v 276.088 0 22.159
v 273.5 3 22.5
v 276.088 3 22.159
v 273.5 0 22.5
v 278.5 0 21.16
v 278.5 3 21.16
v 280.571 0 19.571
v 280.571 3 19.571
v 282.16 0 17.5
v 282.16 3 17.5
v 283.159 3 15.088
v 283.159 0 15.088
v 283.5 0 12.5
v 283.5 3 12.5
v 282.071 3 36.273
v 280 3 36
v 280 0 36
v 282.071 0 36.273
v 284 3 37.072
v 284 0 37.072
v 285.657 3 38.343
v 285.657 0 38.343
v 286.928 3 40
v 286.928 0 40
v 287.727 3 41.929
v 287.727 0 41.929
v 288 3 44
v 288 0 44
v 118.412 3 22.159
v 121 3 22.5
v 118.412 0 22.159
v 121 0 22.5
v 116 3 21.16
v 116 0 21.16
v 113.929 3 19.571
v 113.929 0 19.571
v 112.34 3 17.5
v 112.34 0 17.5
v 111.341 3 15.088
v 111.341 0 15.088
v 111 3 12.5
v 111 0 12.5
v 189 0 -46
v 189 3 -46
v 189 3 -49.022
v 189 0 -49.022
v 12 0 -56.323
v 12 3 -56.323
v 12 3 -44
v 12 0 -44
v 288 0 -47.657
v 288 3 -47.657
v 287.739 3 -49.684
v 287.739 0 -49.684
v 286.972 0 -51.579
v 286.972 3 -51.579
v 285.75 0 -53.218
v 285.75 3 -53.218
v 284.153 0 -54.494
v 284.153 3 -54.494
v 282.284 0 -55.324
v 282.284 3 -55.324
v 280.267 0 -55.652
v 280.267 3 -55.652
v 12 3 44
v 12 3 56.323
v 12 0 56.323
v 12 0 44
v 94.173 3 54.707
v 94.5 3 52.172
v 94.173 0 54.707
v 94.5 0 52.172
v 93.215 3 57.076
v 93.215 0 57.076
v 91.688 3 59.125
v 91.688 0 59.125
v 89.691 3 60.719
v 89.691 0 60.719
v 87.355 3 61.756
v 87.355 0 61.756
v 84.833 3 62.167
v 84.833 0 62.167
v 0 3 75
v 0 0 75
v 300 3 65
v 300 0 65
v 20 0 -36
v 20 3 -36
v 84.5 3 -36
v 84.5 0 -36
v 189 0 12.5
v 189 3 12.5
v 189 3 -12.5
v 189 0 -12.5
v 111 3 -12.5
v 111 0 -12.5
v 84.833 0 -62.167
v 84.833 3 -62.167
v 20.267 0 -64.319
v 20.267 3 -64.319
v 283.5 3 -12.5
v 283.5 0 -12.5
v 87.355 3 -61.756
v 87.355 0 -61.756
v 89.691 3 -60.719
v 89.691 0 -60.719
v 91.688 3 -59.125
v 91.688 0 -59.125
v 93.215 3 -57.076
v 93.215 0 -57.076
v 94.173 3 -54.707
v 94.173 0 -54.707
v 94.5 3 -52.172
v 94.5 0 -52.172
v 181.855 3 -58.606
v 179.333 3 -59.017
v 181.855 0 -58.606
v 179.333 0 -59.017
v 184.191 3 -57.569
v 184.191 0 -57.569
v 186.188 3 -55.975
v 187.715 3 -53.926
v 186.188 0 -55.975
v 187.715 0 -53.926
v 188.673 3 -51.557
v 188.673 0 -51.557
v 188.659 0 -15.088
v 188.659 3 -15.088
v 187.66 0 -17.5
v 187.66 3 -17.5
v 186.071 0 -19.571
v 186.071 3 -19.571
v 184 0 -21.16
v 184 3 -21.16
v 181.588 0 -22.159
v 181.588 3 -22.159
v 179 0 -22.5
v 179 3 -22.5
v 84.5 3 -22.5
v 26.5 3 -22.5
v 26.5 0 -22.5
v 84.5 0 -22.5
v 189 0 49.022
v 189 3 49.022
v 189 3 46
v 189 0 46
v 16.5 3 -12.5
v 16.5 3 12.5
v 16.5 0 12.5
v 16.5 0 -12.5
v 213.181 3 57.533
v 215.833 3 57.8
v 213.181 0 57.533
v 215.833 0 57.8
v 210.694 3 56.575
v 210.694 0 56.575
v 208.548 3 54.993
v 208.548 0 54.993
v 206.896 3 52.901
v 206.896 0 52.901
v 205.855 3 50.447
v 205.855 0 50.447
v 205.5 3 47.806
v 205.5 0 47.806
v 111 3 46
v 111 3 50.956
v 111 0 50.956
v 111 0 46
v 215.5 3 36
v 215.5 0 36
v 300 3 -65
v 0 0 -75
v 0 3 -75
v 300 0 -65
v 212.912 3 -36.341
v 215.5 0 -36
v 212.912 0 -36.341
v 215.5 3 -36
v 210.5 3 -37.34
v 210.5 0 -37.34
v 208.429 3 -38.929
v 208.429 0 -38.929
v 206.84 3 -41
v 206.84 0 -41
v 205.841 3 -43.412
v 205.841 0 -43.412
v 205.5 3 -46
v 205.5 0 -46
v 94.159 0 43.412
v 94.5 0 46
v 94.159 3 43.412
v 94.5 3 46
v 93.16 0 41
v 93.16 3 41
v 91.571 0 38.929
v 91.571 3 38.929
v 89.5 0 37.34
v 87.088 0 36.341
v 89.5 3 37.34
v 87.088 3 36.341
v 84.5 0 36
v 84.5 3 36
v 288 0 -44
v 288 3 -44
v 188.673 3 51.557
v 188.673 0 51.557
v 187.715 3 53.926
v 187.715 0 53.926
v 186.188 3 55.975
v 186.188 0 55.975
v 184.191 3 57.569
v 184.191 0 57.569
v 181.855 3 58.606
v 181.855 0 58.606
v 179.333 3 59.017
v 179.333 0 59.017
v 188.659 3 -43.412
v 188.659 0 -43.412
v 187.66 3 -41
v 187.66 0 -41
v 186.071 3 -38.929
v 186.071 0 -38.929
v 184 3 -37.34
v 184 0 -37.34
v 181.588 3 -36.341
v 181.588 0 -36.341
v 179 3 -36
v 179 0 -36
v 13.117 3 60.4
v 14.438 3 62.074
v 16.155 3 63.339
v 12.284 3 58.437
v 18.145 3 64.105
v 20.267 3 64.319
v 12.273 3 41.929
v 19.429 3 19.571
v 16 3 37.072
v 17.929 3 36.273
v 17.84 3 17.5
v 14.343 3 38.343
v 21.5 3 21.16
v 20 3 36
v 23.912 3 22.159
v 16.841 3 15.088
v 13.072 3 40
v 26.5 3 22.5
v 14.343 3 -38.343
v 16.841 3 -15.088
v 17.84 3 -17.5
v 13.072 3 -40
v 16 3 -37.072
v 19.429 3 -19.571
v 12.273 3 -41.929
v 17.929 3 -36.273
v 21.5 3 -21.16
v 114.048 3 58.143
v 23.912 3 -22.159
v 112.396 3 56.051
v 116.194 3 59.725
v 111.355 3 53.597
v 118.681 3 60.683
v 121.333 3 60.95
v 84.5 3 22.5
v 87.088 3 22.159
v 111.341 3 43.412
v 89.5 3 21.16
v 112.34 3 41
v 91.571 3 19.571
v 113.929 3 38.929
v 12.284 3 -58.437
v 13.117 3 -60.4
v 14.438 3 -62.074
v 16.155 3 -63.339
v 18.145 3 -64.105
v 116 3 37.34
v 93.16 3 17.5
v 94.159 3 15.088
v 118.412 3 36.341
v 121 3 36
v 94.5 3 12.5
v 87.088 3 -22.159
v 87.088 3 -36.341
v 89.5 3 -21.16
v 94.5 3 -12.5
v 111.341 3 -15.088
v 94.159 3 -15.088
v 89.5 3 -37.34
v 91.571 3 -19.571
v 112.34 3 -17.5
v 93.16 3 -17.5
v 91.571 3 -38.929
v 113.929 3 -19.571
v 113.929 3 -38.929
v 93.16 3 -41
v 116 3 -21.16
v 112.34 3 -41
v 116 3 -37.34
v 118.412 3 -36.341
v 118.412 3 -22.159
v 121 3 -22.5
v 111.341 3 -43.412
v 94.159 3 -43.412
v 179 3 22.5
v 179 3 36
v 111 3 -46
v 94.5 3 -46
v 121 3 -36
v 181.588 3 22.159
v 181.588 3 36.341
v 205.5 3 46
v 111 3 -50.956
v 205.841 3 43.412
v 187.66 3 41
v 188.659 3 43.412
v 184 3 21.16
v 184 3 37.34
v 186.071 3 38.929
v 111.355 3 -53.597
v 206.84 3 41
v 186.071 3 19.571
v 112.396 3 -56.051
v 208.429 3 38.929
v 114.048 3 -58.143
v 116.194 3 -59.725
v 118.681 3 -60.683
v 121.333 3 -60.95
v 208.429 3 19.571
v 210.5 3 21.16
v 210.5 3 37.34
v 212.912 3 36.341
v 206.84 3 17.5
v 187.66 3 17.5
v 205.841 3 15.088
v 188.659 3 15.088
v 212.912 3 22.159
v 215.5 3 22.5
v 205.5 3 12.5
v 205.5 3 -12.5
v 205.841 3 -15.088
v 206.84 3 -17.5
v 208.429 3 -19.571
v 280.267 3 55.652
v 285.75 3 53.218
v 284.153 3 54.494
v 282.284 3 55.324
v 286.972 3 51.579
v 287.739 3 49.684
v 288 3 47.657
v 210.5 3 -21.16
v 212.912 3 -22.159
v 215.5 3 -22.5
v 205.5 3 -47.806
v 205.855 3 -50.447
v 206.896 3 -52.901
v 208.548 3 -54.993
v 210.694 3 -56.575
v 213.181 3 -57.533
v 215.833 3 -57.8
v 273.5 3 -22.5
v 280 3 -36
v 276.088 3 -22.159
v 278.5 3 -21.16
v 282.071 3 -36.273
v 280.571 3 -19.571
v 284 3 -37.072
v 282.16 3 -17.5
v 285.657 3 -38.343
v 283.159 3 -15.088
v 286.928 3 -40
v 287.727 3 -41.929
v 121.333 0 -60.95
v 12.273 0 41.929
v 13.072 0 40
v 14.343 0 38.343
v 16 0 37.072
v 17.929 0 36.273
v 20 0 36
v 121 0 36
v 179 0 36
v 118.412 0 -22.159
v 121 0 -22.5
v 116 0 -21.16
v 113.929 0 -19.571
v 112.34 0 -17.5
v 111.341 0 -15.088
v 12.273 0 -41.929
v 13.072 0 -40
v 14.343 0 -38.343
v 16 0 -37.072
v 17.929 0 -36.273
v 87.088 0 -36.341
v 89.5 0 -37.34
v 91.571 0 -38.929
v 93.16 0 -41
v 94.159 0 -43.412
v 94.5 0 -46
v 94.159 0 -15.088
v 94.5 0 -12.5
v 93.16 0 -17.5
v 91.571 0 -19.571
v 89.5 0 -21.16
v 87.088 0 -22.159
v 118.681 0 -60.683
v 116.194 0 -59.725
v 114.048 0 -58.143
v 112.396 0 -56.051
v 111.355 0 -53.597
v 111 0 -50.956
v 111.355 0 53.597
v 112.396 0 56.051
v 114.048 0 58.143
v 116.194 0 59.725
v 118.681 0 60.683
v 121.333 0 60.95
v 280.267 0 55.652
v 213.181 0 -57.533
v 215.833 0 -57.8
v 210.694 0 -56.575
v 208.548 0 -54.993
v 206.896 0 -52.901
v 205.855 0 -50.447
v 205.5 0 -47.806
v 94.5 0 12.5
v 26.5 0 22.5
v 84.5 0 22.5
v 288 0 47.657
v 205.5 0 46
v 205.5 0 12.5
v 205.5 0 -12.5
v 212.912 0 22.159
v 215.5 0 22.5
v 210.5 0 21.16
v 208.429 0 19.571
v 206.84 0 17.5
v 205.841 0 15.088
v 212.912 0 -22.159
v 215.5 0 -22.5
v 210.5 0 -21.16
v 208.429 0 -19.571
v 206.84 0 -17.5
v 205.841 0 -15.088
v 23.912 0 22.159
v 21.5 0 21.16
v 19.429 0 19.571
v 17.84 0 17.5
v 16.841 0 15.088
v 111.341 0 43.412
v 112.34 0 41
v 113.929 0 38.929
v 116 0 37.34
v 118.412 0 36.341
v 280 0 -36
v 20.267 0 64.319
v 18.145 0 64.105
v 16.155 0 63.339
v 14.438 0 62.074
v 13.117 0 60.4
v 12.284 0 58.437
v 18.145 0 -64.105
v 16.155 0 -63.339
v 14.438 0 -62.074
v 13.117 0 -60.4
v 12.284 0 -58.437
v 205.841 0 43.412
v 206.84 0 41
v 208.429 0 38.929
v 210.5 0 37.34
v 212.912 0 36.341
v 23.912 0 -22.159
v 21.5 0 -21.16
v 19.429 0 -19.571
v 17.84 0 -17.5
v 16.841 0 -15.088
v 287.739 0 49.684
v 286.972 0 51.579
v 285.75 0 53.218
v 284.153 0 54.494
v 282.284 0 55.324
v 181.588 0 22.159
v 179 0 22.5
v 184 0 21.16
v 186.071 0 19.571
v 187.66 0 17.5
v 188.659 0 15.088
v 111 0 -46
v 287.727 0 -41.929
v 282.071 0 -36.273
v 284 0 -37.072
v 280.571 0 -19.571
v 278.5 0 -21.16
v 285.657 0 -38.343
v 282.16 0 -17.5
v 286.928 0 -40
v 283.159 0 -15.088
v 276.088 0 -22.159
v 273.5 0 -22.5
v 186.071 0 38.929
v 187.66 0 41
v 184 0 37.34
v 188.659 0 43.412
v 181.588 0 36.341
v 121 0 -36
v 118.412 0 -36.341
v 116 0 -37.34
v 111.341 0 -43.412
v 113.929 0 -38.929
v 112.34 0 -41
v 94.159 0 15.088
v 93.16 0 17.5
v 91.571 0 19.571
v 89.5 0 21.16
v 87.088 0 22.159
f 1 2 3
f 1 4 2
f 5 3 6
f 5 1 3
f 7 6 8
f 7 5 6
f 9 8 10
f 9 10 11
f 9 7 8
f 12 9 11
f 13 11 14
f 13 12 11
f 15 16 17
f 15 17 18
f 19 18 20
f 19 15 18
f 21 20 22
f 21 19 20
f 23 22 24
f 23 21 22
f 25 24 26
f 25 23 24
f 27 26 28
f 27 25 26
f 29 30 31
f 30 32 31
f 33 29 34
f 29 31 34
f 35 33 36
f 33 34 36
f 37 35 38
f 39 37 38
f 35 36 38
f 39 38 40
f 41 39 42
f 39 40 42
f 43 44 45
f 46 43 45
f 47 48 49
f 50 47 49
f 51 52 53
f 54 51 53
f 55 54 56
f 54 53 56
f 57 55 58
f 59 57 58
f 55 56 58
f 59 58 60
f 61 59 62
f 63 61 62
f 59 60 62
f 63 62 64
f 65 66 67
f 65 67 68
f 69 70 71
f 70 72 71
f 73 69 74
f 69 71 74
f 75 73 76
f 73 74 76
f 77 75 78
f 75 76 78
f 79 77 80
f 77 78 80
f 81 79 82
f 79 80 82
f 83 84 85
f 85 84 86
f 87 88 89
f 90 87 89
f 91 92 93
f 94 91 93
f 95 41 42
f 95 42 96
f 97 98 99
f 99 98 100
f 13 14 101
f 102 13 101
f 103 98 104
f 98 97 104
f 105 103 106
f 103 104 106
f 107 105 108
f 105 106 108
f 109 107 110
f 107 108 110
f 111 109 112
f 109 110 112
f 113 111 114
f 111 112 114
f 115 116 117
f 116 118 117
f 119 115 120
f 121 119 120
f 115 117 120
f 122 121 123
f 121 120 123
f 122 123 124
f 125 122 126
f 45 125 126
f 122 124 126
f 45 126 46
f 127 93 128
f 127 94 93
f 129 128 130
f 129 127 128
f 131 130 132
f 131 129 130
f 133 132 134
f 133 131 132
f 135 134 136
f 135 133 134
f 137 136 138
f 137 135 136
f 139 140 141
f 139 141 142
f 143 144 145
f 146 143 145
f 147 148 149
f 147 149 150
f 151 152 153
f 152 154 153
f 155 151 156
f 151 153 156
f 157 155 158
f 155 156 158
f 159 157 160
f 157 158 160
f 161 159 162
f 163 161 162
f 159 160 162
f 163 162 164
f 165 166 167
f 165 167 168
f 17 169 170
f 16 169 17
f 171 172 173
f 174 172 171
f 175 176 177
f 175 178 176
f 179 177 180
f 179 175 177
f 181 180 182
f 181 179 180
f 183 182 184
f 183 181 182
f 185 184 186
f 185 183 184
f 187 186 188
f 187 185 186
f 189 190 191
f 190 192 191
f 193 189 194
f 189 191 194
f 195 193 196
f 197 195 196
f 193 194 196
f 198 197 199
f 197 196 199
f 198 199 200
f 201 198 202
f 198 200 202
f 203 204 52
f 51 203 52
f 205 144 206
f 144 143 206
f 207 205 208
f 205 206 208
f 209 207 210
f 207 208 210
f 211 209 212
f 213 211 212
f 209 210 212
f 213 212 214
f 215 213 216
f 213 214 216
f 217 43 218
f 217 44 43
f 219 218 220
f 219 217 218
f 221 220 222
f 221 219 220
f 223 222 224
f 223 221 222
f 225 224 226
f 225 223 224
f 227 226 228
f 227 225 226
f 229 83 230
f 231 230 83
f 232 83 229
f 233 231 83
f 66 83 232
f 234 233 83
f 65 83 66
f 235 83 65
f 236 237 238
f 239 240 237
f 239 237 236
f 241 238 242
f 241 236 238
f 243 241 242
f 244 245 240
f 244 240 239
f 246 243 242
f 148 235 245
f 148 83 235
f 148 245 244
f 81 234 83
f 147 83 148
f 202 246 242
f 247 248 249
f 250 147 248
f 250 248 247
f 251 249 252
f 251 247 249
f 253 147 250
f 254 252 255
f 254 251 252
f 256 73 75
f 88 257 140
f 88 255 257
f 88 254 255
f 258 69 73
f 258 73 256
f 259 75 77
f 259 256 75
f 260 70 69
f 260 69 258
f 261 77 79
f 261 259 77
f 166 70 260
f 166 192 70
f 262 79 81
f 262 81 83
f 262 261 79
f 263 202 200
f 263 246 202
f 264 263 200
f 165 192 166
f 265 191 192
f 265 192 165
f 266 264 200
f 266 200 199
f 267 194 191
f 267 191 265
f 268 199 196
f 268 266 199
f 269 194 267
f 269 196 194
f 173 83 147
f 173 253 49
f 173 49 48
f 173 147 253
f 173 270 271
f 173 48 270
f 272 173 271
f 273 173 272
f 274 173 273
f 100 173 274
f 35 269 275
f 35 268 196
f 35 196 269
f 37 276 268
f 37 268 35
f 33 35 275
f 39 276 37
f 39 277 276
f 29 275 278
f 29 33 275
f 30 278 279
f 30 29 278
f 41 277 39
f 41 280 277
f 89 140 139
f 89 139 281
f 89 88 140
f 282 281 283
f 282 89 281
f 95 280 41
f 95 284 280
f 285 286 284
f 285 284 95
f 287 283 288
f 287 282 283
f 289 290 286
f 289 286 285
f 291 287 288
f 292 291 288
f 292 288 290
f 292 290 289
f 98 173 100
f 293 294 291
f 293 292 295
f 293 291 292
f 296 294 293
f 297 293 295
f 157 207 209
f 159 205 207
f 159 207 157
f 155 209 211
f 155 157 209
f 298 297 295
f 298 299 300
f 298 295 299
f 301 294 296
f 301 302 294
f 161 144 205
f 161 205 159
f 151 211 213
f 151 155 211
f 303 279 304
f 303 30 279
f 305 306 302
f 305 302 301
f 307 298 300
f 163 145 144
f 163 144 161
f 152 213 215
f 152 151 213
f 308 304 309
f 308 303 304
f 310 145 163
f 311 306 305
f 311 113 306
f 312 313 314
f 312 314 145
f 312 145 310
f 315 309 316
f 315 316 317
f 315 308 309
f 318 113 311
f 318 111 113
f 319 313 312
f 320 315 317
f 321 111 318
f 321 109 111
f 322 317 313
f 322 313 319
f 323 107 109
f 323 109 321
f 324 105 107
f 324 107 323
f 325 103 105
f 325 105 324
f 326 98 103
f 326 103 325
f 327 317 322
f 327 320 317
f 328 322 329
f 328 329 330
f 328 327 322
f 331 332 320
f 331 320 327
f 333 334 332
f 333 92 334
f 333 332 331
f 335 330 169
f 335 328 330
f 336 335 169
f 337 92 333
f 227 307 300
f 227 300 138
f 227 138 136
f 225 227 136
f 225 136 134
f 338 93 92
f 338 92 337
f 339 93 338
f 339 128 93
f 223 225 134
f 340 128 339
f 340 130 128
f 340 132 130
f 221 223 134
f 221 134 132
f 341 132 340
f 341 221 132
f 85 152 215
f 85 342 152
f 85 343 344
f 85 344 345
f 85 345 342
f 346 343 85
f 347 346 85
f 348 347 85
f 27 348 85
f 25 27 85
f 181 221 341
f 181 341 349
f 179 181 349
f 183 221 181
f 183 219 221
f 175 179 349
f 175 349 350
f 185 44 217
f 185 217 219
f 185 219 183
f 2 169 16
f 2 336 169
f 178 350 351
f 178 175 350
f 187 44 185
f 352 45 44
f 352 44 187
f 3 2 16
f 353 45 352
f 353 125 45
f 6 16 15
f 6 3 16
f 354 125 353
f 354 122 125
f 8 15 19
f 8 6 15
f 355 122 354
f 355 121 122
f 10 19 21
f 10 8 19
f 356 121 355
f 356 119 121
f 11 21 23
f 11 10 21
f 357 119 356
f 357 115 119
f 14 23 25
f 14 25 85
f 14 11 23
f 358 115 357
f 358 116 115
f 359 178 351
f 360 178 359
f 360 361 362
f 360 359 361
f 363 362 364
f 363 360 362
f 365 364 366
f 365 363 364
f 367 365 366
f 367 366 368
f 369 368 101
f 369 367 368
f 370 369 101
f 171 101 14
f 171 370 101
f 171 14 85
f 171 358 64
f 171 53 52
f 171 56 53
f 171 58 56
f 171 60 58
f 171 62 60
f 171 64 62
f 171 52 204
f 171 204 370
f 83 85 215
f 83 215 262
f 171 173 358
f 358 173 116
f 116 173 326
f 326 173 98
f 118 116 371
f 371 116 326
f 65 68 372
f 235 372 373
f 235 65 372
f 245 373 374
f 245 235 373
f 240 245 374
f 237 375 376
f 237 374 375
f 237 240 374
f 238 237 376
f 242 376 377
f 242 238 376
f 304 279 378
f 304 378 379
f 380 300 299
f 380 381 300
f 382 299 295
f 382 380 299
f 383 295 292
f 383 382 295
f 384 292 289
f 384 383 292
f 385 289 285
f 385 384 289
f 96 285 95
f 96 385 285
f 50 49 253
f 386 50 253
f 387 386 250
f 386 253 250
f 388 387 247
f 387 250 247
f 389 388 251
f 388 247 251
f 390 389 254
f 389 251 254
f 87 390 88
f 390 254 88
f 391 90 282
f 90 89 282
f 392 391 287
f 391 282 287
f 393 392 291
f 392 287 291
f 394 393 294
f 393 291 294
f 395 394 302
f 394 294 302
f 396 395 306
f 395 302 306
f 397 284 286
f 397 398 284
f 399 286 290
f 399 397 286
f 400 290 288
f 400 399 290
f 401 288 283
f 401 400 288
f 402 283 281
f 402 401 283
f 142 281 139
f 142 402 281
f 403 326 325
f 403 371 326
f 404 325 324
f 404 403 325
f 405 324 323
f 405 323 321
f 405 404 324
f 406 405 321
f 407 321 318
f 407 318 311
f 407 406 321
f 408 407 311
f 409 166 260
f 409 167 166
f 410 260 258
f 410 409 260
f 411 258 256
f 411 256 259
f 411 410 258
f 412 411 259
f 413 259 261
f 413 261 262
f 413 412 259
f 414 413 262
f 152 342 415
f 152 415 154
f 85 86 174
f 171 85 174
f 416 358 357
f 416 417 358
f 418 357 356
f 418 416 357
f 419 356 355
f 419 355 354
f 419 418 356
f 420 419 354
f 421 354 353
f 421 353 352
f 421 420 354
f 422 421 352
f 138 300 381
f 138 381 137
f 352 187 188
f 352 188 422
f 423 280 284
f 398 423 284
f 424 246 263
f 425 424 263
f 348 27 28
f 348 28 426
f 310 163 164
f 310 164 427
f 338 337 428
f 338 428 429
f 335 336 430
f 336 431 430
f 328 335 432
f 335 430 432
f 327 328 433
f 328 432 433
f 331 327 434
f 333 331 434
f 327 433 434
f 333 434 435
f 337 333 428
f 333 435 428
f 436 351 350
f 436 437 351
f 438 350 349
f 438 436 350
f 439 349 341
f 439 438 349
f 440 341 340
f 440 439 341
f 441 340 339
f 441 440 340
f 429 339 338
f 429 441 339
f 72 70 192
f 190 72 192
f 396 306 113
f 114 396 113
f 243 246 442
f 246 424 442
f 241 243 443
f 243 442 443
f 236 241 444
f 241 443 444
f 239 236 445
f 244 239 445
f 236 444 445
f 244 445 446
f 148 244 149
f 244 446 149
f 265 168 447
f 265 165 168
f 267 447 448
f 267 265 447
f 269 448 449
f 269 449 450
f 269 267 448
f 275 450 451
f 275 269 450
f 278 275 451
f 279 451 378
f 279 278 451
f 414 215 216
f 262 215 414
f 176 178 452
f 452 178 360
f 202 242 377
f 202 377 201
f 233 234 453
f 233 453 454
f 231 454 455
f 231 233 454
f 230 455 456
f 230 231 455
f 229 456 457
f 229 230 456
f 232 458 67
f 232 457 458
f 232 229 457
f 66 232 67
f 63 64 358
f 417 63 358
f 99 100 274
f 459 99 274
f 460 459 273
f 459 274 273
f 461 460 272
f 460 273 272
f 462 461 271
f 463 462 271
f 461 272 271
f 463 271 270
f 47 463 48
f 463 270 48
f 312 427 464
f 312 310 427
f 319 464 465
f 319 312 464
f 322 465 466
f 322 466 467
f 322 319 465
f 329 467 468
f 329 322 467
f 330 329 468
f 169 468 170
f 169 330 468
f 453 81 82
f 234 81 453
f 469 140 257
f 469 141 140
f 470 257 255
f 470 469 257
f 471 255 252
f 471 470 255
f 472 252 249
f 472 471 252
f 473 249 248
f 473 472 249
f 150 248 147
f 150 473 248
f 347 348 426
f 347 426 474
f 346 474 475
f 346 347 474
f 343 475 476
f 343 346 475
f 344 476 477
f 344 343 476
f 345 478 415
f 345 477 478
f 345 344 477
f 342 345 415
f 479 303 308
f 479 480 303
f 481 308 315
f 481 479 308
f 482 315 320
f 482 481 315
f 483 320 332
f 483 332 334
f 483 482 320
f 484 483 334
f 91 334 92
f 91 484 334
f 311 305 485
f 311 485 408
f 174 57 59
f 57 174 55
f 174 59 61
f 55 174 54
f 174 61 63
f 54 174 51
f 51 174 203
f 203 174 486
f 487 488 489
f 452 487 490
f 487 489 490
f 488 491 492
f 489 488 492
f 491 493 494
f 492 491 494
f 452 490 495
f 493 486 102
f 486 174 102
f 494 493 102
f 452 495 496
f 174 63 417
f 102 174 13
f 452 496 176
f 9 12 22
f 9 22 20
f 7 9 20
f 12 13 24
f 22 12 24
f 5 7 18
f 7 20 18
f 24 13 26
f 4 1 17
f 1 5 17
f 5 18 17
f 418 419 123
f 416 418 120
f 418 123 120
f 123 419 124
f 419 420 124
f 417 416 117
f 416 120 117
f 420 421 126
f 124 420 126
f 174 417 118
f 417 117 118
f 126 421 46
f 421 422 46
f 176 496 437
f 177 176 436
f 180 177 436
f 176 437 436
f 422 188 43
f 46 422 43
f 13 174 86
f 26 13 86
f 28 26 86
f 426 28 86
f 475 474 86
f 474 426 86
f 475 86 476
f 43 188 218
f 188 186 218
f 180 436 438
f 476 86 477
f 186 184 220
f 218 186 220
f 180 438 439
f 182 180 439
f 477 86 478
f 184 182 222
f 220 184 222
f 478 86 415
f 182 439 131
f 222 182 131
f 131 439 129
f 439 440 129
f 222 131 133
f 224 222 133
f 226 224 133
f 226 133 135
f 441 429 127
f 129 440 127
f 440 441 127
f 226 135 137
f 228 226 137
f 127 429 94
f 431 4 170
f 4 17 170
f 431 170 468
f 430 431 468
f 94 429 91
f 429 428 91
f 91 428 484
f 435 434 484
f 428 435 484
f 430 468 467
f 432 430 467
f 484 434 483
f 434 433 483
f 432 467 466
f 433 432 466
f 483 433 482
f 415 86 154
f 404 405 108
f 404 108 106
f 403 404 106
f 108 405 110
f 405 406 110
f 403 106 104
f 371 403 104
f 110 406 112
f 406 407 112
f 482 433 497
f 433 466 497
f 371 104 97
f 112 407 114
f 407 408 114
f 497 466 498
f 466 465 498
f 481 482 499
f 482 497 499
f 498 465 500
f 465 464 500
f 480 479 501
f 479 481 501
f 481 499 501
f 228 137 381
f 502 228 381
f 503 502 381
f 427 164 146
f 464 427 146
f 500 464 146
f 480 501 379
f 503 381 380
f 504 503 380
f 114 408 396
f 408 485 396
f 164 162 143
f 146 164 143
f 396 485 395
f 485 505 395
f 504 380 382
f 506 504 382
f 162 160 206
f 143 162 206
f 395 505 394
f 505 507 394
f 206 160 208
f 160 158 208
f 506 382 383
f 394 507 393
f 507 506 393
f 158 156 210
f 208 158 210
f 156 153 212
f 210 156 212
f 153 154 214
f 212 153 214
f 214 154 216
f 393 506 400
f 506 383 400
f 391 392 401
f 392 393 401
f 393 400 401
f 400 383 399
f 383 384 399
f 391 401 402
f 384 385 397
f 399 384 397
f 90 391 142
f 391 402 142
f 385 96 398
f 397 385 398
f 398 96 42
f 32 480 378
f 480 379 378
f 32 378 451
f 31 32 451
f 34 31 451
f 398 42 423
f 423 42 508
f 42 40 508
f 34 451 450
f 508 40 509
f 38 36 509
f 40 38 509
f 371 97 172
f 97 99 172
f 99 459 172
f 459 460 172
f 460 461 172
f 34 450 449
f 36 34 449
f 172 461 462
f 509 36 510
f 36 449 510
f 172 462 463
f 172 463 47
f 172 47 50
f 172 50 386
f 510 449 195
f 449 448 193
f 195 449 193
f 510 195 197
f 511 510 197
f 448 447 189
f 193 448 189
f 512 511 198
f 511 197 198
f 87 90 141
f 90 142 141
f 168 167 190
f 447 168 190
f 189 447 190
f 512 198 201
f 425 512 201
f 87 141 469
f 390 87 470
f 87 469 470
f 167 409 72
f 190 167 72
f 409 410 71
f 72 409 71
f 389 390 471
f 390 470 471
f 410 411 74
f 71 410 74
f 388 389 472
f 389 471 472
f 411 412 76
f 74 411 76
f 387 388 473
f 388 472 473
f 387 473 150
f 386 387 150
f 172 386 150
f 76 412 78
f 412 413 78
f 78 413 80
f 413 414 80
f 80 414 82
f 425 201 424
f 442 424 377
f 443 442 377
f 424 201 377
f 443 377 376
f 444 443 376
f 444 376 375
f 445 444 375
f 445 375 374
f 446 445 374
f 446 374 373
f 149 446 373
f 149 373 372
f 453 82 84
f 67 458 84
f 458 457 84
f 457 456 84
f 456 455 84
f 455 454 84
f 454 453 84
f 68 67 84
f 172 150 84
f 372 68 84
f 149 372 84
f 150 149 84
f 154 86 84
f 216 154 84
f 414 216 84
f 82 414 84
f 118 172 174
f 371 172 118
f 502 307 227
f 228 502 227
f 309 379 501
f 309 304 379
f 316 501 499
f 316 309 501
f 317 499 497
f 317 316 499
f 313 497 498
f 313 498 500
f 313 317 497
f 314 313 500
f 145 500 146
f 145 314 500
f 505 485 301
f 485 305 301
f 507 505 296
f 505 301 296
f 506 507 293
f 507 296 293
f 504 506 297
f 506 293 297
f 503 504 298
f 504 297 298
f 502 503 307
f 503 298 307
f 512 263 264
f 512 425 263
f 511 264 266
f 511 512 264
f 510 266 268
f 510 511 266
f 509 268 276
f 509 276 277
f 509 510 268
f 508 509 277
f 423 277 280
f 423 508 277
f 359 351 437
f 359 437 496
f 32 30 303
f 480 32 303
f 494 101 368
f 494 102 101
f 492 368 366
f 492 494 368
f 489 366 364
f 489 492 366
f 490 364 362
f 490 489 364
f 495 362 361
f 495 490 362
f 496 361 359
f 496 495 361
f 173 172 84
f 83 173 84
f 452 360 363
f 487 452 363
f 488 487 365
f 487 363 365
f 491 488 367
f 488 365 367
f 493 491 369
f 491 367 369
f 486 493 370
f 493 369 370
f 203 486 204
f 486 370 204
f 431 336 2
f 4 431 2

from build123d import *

# Parameters (mm, degrees)
BOSS_EXTRUDE1_DEPTH = 3
SKETCH2_W           = 78
SKETCH2_H           = 45
CUT_EXTRUDE1_DEPTH  = 10
FILLET1_R           = 10
CUT_EXTRUDE2_DEPTH  = 10
SKETCH4_W           = 16.5
SKETCH4_H           = 134.835477832
SKETCH4_H_2         = 126.10677569
BOSS_EXTRUDE2_DEPTH = 3
FILLET2_R           = 10
FILLET3_R           = 10


with BuildPart() as part:
    # Sketch1 → Boss-Extrude1 (new body)
    with BuildSketch(Plane(origin=(0, 0, 0), x_dir=(1, 0, 0), z_dir=(0, 1, 0))):
        Polygon((0, 0), (0, 75.000000004), (300, 65), (300, 0), align=None)
    boss_extrude1 = extrude(amount=BOSS_EXTRUDE1_DEPTH)

    # Mirror1: Boss-Extrude1 across Front Plane
    add(boss_extrude1.mirror(Plane.XY))

    # Sketch2 → Cut-Extrude1 (cut)
    with BuildSketch(Plane(origin=(0, 3, 0), x_dir=(1, 0, 0), z_dir=(0, 1, 0))):
        with Locations((55.5, 0)):
            Rectangle(SKETCH2_W, SKETCH2_H)
        with Locations((150, 0)):
            Rectangle(SKETCH2_W, SKETCH2_H)
        with Locations((244.5, 0)):
            Rectangle(SKETCH2_W, SKETCH2_H)
    extrude(amount=-CUT_EXTRUDE1_DEPTH, mode=Mode.SUBTRACT)

    # Fillet1
    fillet1_edges = [part.edges().sort_by_distance(p)[0] for p in [
        (16.5, 1.5, 22.5),
        (16.5, 1.5, -22.5),
        (94.5, 1.5, -22.5),
        (94.5, 1.5, 22.5),
        (111, 1.5, 22.5),
        (111, 1.5, -22.5),
        (189, 1.5, -22.5),
        (189, 1.5, 22.5),
        (205.5, 1.5, 22.5),
        (205.5, 1.5, -22.5),
        (283.5, 1.5, -22.5),
        (283.5, 1.5, 22.5),
    ]]
    fillet(fillet1_edges, radius=FILLET1_R)

    # Sketch3 → Cut-Extrude2 (cut)
    with BuildSketch(Plane(origin=(0, 3, 0), x_dir=(1, 0, 0), z_dir=(0, 1, 0))):
        with BuildLine():
            Line((12, 56.323336113), (12, 44))
            ThreePointArc((12, 44), (14.343145751, 38.343145751), (20, 36))
            Line((20, 36), (280, 36))
            ThreePointArc((280, 36), (285.656854249, 38.343145751), (288, 44))
            Line((288, 44), (288, 47.656669443))
            ThreePointArc((288, 47.656669443), (285.750310824, 53.218496969), (280.266518642, 55.652228699))
            Line((280.266518642, 55.652228699), (20.266518642, 64.318895369))
            ThreePointArc((20.266518642, 64.318895369), (14.438172474, 62.073646937), (12, 56.323336113))
        make_face()
    cut_extrude2 = extrude(amount=-CUT_EXTRUDE2_DEPTH, mode=Mode.SUBTRACT)

    # Mirror2: Cut-Extrude2 across plane
    add(cut_extrude2.mirror(Plane.XY), mode=Mode.SUBTRACT)

    # Sketch4 → Boss-Extrude2 (add)
    with BuildSketch(Plane(origin=(0, 3, 0), x_dir=(1, 0, 0), z_dir=(0, 1, 0))):
        with Locations((102.75, 0)):
            Rectangle(SKETCH4_W, SKETCH4_H)
        with Locations((197.25, 0)):
            Rectangle(SKETCH4_W, SKETCH4_H_2)
    extrude(amount=-BOSS_EXTRUDE2_DEPTH)

    # Fillet2
    fillet2_edges = [part.edges().sort_by_distance(p)[0] for p in [
        (111, 1.5, -36),
        (111, 1.5, -61.294445989),
        (94.5, 1.5, -36),
        (94.5, 1.5, -61.844445989),
        (189, 1.5, -36),
        (205.5, 1.5, -36),
        (205.5, 1.5, -58.144445988),
        (189, 1.5, -58.694445988),
    ]]
    fillet(fillet2_edges, radius=FILLET2_R)

    # Fillet3
    fillet3_edges = [part.edges().sort_by_distance(p)[0] for p in [
        (94.5, 1.5, 36),
        (111, 1.5, 36),
        (111, 1.5, 61.294445989),
        (94.5, 1.5, 61.844445989),
        (189, 1.5, 58.694445988),
        (189, 1.5, 36),
        (205.5, 1.5, 58.144445988),
        (205.5, 1.5, 36),
    ]]
    fillet(fillet3_edges, radius=FILLET3_R)


solid = part.part
